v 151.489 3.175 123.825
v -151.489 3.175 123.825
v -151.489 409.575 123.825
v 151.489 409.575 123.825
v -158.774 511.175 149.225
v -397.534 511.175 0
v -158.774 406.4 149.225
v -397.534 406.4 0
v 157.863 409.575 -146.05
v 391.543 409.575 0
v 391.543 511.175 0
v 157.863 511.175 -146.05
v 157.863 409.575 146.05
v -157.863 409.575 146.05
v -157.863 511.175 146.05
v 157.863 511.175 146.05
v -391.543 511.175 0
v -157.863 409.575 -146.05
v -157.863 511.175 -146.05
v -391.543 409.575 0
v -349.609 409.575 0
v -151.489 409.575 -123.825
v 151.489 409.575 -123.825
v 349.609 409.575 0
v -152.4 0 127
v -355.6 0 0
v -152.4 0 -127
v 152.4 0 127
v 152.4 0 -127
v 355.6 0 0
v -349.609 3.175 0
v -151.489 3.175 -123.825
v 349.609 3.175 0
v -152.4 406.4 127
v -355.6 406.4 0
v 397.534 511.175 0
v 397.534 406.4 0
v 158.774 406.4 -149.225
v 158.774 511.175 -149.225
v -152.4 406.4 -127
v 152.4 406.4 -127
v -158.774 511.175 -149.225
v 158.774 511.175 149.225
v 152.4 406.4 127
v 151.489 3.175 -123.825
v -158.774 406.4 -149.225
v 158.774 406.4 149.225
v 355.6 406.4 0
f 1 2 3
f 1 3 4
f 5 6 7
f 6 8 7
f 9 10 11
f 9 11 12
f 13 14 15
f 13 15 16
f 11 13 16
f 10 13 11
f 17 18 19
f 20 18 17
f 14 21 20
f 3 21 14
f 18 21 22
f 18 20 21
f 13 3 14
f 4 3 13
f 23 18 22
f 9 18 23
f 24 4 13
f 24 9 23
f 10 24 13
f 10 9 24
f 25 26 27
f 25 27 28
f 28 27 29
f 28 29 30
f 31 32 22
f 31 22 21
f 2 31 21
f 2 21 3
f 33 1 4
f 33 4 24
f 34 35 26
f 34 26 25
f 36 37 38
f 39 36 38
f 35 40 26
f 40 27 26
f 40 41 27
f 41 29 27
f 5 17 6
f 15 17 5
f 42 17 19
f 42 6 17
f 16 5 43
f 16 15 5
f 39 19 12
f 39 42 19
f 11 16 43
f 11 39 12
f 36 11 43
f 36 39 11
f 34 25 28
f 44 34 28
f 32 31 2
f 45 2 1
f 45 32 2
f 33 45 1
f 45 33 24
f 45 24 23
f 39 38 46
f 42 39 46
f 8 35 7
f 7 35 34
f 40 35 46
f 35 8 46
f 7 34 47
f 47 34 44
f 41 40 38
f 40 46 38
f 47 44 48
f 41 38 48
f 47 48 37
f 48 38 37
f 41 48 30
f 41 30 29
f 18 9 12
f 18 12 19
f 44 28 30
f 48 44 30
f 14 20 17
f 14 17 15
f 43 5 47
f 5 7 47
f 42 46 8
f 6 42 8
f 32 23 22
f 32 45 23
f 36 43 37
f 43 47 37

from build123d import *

# Parameters (mm, degrees)
BOSS_EXTRUDE1_DEPTH = 3.175
BOSS_EXTRUDE2_DEPTH = 403.225
BOSS_EXTRUDE3_DEPTH = 3.175
BOSS_EXTRUDE4_DEPTH = 101.6


with BuildPart() as part:
    # Sketch2 → Boss-Extrude1 (new body)
    with BuildSketch(Plane(origin=(0, 0, 0), x_dir=(1, 0, 0), z_dir=(0, 1, 0))):
        Polygon((-152.4, 127), (-355.6, 0), (-152.4, -127), (152.4, -127), (355.6, 0), (152.4, 127), align=None)
    extrude(amount=BOSS_EXTRUDE1_DEPTH)

    # Sketch3 → Boss-Extrude2 (add)
    with BuildSketch(Plane(origin=(0, 3.175, 0), x_dir=(1, 0, 0), z_dir=(0, 1, 0))):
        Polygon((152.4, -127), (355.6, 0), (152.4, 127), (-152.4, 127), (-355.6, 0), (-152.4, -127), align=None)
        Polygon((151.489421981, -123.825), (349.609421981, 0), (151.489421981, 123.825), (-151.489421981, 123.825), (-349.609421981, 0), (-151.489421981, -123.825), align=None, mode=Mode.SUBTRACT)
    extrude(amount=BOSS_EXTRUDE2_DEPTH)

    # Sketch5 → Boss-Extrude3 (add)
    with BuildSketch(Plane(origin=(0, 406.4, 0), x_dir=(1, 0, 0), z_dir=(0, 1, 0))):
        Polygon((158.774046132, 149.225), (-158.774046132, 149.225), (-397.534046132, 0), (-158.774046132, -149.225), (158.774046132, -149.225), (397.534046132, 0), align=None)
        Polygon((151.489421981, 123.825), (-151.489421981, 123.825), (-349.609421981, 0), (-151.489421981, -123.825), (151.489421981, -123.825), (349.609421981, 0), align=None, mode=Mode.SUBTRACT)
    extrude(amount=BOSS_EXTRUDE3_DEPTH)

    # Sketch6 → Boss-Extrude4 (add)
    with BuildSketch(Plane(origin=(0, 409.575, 0), x_dir=(1, 0, 0), z_dir=(0, 1, 0))):
        Polygon((-158.774046132, 149.225), (-397.534046132, 0), (-158.774046132, -149.225), (158.774046132, -149.225), (397.534046132, 0), (158.774046132, 149.225), align=None)
        Polygon((-157.863468113, 146.05), (-391.543468113, 0), (-157.863468113, -146.05), (157.863468113, -146.05), (391.543468113, 0), (157.863468113, 146.05), align=None, mode=Mode.SUBTRACT)
    extrude(amount=BOSS_EXTRUDE4_DEPTH)


solid = part.part
